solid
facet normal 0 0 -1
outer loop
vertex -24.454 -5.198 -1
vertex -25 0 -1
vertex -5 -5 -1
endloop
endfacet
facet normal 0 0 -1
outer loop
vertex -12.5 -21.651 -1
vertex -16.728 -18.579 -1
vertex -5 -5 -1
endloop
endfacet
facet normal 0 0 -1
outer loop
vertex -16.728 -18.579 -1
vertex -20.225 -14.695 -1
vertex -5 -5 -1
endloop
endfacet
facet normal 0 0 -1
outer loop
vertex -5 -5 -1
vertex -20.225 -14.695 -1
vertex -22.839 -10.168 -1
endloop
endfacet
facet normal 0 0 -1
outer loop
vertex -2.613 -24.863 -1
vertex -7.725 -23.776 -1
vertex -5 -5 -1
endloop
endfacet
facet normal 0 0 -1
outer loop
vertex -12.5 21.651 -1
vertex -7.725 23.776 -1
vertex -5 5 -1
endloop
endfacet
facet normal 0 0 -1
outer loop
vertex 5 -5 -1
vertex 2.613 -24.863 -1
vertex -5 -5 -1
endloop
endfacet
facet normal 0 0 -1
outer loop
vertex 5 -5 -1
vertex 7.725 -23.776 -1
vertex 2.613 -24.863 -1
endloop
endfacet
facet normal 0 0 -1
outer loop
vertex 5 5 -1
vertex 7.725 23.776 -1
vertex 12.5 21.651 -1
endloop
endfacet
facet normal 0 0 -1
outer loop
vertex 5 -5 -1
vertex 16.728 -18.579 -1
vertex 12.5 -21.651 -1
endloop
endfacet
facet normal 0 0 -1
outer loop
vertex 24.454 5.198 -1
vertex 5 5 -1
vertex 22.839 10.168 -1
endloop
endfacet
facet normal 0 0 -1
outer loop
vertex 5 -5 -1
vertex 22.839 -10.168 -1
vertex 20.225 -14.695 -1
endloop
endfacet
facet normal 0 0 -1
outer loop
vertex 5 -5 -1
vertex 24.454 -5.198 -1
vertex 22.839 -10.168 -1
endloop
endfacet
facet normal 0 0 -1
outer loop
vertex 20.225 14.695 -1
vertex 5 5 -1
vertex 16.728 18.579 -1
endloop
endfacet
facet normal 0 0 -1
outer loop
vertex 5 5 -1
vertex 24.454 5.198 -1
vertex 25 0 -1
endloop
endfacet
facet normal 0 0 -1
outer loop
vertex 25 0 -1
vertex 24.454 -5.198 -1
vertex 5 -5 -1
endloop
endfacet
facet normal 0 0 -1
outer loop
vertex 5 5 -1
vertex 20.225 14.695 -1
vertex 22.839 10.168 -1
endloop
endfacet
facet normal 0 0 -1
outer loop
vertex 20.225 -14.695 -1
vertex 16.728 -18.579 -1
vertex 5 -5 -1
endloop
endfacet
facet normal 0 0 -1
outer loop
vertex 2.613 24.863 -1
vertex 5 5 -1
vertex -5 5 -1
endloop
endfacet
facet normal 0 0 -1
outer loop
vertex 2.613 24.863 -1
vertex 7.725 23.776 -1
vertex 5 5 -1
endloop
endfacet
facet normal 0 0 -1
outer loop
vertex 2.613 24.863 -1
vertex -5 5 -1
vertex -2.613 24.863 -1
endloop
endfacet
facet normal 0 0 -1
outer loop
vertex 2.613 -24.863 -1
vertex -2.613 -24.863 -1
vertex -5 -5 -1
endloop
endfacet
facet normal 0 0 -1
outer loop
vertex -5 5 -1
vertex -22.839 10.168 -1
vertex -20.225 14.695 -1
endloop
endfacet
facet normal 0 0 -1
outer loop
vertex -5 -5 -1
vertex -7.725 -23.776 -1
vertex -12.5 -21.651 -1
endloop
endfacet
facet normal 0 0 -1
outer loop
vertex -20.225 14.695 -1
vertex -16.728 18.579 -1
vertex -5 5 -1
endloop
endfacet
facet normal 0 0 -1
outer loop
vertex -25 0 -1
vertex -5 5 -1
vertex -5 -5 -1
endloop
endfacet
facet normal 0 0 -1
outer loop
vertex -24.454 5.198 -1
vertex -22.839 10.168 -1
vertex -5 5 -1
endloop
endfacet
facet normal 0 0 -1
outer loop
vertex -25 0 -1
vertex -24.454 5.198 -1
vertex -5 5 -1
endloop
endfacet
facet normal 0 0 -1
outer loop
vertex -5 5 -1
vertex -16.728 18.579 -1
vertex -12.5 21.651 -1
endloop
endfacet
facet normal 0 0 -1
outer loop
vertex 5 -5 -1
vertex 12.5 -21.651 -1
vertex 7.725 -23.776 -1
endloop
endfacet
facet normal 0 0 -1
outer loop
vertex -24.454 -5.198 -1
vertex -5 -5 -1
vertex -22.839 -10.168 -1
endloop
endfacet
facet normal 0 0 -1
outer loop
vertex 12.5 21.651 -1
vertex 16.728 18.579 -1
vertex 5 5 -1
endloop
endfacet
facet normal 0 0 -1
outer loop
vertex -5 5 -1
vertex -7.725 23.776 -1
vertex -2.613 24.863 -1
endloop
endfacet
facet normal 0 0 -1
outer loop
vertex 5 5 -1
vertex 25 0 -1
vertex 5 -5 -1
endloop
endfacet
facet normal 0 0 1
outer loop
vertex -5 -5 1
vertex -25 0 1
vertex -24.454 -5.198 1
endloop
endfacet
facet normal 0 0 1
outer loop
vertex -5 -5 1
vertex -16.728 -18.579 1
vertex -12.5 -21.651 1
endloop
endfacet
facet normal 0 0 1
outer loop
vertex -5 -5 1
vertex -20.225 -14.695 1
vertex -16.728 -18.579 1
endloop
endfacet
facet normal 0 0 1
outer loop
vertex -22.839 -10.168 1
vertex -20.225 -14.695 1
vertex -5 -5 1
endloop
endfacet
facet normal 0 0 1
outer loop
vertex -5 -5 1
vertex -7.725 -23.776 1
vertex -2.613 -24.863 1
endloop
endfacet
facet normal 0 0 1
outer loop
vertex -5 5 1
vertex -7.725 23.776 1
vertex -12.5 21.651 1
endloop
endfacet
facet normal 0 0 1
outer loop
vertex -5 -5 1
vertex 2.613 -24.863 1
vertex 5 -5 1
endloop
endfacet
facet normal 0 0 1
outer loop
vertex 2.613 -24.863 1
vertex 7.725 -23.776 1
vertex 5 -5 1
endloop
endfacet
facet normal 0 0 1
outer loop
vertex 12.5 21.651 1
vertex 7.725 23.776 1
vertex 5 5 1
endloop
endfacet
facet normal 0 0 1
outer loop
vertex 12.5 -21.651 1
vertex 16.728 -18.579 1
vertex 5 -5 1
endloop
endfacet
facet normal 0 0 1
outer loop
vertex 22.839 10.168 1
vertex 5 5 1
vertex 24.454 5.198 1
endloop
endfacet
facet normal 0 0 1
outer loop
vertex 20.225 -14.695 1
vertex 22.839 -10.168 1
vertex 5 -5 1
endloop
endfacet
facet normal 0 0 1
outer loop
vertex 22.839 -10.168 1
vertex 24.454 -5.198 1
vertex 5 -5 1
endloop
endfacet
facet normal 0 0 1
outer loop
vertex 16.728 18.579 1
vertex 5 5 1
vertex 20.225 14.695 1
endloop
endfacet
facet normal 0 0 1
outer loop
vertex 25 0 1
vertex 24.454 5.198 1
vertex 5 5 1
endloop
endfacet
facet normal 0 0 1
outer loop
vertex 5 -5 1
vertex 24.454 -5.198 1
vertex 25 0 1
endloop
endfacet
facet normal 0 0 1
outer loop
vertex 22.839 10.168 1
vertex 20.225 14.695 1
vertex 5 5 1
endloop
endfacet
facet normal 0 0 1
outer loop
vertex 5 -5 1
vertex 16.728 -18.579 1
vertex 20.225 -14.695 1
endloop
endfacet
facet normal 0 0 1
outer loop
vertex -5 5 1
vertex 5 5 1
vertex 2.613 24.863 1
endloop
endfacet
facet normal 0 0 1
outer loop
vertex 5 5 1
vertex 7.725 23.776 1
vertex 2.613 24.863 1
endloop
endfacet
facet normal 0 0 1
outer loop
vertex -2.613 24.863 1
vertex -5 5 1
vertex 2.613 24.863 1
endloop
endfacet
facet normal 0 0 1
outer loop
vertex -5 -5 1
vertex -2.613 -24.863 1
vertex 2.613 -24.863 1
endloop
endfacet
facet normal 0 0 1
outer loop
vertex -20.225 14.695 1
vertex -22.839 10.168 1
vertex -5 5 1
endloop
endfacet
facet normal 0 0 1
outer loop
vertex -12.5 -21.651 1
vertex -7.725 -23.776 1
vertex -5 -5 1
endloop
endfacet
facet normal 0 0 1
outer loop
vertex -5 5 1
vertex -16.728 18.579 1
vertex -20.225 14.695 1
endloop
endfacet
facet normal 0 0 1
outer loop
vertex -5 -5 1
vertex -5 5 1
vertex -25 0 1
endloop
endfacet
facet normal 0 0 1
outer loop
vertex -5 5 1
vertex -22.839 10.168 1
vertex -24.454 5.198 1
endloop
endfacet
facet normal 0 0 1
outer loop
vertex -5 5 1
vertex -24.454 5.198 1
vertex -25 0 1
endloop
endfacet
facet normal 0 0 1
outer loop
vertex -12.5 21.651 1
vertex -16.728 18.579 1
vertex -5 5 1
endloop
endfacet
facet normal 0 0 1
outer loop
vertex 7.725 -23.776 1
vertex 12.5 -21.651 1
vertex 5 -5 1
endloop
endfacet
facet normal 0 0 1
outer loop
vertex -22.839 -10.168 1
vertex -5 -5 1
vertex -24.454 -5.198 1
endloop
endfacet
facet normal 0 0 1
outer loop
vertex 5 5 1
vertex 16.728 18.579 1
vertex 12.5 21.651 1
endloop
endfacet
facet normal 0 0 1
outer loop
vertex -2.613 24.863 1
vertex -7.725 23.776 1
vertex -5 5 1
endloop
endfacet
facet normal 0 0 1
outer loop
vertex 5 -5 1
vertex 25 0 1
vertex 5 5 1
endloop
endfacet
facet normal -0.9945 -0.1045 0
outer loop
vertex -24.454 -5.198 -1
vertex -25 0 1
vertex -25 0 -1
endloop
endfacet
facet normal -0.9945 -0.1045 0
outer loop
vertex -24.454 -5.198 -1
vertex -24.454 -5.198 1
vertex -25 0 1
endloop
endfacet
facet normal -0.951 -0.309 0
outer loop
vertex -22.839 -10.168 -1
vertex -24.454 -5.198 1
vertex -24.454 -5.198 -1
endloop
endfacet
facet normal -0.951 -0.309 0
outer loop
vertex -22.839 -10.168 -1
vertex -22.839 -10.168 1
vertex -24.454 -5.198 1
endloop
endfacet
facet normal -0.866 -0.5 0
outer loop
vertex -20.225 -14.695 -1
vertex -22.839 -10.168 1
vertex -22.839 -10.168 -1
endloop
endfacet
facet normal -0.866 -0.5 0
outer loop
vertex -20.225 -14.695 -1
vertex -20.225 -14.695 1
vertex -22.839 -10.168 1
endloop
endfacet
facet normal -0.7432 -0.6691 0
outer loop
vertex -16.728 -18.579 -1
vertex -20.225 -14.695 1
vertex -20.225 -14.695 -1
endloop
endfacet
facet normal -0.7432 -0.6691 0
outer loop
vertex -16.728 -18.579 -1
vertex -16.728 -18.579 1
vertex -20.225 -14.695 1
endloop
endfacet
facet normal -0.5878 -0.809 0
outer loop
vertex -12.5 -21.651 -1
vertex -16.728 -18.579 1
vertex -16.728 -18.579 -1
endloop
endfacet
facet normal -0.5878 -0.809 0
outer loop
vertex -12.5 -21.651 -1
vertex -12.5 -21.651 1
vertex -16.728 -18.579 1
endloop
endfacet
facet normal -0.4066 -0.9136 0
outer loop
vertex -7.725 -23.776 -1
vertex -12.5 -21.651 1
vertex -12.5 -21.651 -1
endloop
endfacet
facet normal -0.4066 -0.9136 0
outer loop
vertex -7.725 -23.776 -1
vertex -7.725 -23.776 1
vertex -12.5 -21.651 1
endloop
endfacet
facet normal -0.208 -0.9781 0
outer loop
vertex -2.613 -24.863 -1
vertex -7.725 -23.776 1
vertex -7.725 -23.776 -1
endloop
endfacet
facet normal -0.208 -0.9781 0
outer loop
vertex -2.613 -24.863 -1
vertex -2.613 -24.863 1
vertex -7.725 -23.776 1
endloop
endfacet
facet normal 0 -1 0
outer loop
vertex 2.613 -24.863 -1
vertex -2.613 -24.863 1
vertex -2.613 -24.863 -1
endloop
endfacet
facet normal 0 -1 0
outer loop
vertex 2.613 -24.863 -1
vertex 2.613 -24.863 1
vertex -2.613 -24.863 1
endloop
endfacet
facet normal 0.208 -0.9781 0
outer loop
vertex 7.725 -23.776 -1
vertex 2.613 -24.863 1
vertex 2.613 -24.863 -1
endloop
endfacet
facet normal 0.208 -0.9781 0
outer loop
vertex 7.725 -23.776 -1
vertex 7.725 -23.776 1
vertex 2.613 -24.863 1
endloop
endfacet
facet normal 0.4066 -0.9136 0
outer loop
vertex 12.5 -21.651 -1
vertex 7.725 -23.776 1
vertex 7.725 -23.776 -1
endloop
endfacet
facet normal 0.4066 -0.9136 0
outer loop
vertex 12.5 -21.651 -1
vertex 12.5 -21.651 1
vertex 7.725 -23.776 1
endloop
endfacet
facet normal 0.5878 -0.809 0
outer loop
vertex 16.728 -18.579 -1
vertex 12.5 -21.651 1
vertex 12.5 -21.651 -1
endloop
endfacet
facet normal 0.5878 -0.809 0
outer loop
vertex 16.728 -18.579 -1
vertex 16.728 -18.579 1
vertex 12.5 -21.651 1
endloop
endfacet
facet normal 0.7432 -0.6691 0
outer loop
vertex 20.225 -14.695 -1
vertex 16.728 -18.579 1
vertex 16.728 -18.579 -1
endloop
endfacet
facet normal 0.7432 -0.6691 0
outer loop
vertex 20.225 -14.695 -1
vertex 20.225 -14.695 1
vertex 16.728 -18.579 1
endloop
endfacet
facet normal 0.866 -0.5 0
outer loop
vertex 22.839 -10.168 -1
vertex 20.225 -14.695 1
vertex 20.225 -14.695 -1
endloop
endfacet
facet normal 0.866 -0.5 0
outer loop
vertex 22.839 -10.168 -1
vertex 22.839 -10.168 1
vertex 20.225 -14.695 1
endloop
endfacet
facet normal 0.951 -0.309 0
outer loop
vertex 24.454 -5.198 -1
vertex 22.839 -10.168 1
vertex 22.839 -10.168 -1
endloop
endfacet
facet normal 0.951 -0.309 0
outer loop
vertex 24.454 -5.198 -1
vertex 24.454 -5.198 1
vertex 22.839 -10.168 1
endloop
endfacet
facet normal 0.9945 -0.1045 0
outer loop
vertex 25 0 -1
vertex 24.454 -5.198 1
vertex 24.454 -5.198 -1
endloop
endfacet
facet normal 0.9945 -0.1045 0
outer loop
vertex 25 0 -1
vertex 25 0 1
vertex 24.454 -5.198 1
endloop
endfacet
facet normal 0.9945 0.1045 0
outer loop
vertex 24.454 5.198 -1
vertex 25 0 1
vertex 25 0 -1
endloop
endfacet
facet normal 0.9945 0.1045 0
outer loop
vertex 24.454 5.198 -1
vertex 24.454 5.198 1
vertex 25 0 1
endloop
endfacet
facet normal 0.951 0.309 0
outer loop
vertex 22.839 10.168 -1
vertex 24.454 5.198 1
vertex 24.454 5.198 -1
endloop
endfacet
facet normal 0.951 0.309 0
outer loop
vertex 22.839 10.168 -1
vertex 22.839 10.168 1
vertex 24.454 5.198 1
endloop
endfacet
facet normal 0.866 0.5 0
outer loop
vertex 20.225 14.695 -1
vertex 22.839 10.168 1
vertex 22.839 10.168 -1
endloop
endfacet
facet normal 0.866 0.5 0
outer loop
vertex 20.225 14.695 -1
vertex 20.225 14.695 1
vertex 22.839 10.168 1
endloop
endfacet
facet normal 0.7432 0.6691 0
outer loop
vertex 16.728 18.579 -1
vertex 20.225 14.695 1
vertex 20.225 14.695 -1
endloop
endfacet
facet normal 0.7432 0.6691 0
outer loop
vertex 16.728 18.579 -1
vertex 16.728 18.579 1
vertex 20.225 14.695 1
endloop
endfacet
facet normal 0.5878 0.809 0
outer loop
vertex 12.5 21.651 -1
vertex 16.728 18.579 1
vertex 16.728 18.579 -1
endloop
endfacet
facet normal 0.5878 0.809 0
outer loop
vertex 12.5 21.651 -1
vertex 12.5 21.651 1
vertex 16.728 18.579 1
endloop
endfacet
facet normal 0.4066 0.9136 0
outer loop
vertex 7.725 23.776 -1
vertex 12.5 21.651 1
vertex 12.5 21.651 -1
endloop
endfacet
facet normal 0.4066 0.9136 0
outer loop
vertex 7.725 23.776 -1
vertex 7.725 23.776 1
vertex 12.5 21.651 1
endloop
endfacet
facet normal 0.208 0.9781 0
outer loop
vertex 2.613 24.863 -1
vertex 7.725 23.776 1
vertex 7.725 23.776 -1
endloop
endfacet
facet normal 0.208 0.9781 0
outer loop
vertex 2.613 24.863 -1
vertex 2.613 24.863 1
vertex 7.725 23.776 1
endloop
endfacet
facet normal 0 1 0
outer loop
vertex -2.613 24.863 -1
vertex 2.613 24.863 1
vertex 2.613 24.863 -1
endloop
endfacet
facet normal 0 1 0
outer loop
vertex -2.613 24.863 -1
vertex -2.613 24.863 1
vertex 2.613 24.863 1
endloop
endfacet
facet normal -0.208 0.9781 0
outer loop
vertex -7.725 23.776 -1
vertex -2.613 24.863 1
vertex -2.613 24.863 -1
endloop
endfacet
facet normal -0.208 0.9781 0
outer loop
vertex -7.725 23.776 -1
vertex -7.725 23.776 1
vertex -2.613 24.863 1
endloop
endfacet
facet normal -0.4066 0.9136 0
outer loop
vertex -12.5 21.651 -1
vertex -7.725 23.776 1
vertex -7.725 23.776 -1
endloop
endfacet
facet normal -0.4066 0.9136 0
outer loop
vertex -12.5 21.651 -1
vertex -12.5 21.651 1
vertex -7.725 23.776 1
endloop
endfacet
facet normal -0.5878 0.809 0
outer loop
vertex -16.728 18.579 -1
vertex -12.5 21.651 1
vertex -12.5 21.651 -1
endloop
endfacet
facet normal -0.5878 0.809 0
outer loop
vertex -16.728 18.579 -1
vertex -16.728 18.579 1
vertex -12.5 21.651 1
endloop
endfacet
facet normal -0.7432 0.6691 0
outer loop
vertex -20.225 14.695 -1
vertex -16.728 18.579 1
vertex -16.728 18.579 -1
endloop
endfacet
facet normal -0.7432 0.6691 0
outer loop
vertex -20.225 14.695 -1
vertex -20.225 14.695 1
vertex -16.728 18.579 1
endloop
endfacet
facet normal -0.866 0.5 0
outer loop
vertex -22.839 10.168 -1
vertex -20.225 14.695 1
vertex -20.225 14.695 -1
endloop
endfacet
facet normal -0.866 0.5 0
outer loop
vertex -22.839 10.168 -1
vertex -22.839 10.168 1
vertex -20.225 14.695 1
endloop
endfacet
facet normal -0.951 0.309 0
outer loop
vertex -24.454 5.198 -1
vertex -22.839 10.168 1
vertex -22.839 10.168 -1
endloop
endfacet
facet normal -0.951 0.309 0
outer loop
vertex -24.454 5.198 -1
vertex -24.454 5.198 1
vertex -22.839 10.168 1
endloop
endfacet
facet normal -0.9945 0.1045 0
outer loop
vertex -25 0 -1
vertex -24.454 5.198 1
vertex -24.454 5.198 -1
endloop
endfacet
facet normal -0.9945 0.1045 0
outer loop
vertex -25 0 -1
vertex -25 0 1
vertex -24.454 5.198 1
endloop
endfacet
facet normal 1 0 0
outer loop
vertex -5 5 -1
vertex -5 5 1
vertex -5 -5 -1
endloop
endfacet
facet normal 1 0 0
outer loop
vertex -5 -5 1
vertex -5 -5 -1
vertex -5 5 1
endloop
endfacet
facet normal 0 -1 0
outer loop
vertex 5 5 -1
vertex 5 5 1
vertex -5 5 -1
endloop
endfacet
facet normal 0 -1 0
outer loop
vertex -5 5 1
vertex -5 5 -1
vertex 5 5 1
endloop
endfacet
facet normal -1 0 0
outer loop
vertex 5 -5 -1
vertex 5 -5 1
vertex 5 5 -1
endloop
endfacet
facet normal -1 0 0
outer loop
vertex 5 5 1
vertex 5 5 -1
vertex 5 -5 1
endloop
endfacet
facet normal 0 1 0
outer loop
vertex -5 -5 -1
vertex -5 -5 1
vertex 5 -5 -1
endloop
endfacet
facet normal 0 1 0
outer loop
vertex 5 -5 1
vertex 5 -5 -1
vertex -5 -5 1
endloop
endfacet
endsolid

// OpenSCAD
module thing()
{/*
  $fa = 30;
  difference() {
    sphere(r = 25);
    cylinder(h = 62.5, r1 = 12.5, r2 = 6.25, center = true);
    rotate(90, [ 1, 0, 0 ]) cylinder(h = 62.5,
        r1 = 12.5, r2 = 6.25, center = true);
    rotate(90, [ 0, 1, 0 ]) cylinder(h = 62.5,
        r1 = 12.5, r2 = 6.25, center = true);
  }*/
    difference() {
        sphere(r=25);
        cube(10,center=true);
    }
}


module proj()
{
  linear_extrude(center = true, height = 2) projection(cut = true) thing();
  //% thing();
}

proj();
